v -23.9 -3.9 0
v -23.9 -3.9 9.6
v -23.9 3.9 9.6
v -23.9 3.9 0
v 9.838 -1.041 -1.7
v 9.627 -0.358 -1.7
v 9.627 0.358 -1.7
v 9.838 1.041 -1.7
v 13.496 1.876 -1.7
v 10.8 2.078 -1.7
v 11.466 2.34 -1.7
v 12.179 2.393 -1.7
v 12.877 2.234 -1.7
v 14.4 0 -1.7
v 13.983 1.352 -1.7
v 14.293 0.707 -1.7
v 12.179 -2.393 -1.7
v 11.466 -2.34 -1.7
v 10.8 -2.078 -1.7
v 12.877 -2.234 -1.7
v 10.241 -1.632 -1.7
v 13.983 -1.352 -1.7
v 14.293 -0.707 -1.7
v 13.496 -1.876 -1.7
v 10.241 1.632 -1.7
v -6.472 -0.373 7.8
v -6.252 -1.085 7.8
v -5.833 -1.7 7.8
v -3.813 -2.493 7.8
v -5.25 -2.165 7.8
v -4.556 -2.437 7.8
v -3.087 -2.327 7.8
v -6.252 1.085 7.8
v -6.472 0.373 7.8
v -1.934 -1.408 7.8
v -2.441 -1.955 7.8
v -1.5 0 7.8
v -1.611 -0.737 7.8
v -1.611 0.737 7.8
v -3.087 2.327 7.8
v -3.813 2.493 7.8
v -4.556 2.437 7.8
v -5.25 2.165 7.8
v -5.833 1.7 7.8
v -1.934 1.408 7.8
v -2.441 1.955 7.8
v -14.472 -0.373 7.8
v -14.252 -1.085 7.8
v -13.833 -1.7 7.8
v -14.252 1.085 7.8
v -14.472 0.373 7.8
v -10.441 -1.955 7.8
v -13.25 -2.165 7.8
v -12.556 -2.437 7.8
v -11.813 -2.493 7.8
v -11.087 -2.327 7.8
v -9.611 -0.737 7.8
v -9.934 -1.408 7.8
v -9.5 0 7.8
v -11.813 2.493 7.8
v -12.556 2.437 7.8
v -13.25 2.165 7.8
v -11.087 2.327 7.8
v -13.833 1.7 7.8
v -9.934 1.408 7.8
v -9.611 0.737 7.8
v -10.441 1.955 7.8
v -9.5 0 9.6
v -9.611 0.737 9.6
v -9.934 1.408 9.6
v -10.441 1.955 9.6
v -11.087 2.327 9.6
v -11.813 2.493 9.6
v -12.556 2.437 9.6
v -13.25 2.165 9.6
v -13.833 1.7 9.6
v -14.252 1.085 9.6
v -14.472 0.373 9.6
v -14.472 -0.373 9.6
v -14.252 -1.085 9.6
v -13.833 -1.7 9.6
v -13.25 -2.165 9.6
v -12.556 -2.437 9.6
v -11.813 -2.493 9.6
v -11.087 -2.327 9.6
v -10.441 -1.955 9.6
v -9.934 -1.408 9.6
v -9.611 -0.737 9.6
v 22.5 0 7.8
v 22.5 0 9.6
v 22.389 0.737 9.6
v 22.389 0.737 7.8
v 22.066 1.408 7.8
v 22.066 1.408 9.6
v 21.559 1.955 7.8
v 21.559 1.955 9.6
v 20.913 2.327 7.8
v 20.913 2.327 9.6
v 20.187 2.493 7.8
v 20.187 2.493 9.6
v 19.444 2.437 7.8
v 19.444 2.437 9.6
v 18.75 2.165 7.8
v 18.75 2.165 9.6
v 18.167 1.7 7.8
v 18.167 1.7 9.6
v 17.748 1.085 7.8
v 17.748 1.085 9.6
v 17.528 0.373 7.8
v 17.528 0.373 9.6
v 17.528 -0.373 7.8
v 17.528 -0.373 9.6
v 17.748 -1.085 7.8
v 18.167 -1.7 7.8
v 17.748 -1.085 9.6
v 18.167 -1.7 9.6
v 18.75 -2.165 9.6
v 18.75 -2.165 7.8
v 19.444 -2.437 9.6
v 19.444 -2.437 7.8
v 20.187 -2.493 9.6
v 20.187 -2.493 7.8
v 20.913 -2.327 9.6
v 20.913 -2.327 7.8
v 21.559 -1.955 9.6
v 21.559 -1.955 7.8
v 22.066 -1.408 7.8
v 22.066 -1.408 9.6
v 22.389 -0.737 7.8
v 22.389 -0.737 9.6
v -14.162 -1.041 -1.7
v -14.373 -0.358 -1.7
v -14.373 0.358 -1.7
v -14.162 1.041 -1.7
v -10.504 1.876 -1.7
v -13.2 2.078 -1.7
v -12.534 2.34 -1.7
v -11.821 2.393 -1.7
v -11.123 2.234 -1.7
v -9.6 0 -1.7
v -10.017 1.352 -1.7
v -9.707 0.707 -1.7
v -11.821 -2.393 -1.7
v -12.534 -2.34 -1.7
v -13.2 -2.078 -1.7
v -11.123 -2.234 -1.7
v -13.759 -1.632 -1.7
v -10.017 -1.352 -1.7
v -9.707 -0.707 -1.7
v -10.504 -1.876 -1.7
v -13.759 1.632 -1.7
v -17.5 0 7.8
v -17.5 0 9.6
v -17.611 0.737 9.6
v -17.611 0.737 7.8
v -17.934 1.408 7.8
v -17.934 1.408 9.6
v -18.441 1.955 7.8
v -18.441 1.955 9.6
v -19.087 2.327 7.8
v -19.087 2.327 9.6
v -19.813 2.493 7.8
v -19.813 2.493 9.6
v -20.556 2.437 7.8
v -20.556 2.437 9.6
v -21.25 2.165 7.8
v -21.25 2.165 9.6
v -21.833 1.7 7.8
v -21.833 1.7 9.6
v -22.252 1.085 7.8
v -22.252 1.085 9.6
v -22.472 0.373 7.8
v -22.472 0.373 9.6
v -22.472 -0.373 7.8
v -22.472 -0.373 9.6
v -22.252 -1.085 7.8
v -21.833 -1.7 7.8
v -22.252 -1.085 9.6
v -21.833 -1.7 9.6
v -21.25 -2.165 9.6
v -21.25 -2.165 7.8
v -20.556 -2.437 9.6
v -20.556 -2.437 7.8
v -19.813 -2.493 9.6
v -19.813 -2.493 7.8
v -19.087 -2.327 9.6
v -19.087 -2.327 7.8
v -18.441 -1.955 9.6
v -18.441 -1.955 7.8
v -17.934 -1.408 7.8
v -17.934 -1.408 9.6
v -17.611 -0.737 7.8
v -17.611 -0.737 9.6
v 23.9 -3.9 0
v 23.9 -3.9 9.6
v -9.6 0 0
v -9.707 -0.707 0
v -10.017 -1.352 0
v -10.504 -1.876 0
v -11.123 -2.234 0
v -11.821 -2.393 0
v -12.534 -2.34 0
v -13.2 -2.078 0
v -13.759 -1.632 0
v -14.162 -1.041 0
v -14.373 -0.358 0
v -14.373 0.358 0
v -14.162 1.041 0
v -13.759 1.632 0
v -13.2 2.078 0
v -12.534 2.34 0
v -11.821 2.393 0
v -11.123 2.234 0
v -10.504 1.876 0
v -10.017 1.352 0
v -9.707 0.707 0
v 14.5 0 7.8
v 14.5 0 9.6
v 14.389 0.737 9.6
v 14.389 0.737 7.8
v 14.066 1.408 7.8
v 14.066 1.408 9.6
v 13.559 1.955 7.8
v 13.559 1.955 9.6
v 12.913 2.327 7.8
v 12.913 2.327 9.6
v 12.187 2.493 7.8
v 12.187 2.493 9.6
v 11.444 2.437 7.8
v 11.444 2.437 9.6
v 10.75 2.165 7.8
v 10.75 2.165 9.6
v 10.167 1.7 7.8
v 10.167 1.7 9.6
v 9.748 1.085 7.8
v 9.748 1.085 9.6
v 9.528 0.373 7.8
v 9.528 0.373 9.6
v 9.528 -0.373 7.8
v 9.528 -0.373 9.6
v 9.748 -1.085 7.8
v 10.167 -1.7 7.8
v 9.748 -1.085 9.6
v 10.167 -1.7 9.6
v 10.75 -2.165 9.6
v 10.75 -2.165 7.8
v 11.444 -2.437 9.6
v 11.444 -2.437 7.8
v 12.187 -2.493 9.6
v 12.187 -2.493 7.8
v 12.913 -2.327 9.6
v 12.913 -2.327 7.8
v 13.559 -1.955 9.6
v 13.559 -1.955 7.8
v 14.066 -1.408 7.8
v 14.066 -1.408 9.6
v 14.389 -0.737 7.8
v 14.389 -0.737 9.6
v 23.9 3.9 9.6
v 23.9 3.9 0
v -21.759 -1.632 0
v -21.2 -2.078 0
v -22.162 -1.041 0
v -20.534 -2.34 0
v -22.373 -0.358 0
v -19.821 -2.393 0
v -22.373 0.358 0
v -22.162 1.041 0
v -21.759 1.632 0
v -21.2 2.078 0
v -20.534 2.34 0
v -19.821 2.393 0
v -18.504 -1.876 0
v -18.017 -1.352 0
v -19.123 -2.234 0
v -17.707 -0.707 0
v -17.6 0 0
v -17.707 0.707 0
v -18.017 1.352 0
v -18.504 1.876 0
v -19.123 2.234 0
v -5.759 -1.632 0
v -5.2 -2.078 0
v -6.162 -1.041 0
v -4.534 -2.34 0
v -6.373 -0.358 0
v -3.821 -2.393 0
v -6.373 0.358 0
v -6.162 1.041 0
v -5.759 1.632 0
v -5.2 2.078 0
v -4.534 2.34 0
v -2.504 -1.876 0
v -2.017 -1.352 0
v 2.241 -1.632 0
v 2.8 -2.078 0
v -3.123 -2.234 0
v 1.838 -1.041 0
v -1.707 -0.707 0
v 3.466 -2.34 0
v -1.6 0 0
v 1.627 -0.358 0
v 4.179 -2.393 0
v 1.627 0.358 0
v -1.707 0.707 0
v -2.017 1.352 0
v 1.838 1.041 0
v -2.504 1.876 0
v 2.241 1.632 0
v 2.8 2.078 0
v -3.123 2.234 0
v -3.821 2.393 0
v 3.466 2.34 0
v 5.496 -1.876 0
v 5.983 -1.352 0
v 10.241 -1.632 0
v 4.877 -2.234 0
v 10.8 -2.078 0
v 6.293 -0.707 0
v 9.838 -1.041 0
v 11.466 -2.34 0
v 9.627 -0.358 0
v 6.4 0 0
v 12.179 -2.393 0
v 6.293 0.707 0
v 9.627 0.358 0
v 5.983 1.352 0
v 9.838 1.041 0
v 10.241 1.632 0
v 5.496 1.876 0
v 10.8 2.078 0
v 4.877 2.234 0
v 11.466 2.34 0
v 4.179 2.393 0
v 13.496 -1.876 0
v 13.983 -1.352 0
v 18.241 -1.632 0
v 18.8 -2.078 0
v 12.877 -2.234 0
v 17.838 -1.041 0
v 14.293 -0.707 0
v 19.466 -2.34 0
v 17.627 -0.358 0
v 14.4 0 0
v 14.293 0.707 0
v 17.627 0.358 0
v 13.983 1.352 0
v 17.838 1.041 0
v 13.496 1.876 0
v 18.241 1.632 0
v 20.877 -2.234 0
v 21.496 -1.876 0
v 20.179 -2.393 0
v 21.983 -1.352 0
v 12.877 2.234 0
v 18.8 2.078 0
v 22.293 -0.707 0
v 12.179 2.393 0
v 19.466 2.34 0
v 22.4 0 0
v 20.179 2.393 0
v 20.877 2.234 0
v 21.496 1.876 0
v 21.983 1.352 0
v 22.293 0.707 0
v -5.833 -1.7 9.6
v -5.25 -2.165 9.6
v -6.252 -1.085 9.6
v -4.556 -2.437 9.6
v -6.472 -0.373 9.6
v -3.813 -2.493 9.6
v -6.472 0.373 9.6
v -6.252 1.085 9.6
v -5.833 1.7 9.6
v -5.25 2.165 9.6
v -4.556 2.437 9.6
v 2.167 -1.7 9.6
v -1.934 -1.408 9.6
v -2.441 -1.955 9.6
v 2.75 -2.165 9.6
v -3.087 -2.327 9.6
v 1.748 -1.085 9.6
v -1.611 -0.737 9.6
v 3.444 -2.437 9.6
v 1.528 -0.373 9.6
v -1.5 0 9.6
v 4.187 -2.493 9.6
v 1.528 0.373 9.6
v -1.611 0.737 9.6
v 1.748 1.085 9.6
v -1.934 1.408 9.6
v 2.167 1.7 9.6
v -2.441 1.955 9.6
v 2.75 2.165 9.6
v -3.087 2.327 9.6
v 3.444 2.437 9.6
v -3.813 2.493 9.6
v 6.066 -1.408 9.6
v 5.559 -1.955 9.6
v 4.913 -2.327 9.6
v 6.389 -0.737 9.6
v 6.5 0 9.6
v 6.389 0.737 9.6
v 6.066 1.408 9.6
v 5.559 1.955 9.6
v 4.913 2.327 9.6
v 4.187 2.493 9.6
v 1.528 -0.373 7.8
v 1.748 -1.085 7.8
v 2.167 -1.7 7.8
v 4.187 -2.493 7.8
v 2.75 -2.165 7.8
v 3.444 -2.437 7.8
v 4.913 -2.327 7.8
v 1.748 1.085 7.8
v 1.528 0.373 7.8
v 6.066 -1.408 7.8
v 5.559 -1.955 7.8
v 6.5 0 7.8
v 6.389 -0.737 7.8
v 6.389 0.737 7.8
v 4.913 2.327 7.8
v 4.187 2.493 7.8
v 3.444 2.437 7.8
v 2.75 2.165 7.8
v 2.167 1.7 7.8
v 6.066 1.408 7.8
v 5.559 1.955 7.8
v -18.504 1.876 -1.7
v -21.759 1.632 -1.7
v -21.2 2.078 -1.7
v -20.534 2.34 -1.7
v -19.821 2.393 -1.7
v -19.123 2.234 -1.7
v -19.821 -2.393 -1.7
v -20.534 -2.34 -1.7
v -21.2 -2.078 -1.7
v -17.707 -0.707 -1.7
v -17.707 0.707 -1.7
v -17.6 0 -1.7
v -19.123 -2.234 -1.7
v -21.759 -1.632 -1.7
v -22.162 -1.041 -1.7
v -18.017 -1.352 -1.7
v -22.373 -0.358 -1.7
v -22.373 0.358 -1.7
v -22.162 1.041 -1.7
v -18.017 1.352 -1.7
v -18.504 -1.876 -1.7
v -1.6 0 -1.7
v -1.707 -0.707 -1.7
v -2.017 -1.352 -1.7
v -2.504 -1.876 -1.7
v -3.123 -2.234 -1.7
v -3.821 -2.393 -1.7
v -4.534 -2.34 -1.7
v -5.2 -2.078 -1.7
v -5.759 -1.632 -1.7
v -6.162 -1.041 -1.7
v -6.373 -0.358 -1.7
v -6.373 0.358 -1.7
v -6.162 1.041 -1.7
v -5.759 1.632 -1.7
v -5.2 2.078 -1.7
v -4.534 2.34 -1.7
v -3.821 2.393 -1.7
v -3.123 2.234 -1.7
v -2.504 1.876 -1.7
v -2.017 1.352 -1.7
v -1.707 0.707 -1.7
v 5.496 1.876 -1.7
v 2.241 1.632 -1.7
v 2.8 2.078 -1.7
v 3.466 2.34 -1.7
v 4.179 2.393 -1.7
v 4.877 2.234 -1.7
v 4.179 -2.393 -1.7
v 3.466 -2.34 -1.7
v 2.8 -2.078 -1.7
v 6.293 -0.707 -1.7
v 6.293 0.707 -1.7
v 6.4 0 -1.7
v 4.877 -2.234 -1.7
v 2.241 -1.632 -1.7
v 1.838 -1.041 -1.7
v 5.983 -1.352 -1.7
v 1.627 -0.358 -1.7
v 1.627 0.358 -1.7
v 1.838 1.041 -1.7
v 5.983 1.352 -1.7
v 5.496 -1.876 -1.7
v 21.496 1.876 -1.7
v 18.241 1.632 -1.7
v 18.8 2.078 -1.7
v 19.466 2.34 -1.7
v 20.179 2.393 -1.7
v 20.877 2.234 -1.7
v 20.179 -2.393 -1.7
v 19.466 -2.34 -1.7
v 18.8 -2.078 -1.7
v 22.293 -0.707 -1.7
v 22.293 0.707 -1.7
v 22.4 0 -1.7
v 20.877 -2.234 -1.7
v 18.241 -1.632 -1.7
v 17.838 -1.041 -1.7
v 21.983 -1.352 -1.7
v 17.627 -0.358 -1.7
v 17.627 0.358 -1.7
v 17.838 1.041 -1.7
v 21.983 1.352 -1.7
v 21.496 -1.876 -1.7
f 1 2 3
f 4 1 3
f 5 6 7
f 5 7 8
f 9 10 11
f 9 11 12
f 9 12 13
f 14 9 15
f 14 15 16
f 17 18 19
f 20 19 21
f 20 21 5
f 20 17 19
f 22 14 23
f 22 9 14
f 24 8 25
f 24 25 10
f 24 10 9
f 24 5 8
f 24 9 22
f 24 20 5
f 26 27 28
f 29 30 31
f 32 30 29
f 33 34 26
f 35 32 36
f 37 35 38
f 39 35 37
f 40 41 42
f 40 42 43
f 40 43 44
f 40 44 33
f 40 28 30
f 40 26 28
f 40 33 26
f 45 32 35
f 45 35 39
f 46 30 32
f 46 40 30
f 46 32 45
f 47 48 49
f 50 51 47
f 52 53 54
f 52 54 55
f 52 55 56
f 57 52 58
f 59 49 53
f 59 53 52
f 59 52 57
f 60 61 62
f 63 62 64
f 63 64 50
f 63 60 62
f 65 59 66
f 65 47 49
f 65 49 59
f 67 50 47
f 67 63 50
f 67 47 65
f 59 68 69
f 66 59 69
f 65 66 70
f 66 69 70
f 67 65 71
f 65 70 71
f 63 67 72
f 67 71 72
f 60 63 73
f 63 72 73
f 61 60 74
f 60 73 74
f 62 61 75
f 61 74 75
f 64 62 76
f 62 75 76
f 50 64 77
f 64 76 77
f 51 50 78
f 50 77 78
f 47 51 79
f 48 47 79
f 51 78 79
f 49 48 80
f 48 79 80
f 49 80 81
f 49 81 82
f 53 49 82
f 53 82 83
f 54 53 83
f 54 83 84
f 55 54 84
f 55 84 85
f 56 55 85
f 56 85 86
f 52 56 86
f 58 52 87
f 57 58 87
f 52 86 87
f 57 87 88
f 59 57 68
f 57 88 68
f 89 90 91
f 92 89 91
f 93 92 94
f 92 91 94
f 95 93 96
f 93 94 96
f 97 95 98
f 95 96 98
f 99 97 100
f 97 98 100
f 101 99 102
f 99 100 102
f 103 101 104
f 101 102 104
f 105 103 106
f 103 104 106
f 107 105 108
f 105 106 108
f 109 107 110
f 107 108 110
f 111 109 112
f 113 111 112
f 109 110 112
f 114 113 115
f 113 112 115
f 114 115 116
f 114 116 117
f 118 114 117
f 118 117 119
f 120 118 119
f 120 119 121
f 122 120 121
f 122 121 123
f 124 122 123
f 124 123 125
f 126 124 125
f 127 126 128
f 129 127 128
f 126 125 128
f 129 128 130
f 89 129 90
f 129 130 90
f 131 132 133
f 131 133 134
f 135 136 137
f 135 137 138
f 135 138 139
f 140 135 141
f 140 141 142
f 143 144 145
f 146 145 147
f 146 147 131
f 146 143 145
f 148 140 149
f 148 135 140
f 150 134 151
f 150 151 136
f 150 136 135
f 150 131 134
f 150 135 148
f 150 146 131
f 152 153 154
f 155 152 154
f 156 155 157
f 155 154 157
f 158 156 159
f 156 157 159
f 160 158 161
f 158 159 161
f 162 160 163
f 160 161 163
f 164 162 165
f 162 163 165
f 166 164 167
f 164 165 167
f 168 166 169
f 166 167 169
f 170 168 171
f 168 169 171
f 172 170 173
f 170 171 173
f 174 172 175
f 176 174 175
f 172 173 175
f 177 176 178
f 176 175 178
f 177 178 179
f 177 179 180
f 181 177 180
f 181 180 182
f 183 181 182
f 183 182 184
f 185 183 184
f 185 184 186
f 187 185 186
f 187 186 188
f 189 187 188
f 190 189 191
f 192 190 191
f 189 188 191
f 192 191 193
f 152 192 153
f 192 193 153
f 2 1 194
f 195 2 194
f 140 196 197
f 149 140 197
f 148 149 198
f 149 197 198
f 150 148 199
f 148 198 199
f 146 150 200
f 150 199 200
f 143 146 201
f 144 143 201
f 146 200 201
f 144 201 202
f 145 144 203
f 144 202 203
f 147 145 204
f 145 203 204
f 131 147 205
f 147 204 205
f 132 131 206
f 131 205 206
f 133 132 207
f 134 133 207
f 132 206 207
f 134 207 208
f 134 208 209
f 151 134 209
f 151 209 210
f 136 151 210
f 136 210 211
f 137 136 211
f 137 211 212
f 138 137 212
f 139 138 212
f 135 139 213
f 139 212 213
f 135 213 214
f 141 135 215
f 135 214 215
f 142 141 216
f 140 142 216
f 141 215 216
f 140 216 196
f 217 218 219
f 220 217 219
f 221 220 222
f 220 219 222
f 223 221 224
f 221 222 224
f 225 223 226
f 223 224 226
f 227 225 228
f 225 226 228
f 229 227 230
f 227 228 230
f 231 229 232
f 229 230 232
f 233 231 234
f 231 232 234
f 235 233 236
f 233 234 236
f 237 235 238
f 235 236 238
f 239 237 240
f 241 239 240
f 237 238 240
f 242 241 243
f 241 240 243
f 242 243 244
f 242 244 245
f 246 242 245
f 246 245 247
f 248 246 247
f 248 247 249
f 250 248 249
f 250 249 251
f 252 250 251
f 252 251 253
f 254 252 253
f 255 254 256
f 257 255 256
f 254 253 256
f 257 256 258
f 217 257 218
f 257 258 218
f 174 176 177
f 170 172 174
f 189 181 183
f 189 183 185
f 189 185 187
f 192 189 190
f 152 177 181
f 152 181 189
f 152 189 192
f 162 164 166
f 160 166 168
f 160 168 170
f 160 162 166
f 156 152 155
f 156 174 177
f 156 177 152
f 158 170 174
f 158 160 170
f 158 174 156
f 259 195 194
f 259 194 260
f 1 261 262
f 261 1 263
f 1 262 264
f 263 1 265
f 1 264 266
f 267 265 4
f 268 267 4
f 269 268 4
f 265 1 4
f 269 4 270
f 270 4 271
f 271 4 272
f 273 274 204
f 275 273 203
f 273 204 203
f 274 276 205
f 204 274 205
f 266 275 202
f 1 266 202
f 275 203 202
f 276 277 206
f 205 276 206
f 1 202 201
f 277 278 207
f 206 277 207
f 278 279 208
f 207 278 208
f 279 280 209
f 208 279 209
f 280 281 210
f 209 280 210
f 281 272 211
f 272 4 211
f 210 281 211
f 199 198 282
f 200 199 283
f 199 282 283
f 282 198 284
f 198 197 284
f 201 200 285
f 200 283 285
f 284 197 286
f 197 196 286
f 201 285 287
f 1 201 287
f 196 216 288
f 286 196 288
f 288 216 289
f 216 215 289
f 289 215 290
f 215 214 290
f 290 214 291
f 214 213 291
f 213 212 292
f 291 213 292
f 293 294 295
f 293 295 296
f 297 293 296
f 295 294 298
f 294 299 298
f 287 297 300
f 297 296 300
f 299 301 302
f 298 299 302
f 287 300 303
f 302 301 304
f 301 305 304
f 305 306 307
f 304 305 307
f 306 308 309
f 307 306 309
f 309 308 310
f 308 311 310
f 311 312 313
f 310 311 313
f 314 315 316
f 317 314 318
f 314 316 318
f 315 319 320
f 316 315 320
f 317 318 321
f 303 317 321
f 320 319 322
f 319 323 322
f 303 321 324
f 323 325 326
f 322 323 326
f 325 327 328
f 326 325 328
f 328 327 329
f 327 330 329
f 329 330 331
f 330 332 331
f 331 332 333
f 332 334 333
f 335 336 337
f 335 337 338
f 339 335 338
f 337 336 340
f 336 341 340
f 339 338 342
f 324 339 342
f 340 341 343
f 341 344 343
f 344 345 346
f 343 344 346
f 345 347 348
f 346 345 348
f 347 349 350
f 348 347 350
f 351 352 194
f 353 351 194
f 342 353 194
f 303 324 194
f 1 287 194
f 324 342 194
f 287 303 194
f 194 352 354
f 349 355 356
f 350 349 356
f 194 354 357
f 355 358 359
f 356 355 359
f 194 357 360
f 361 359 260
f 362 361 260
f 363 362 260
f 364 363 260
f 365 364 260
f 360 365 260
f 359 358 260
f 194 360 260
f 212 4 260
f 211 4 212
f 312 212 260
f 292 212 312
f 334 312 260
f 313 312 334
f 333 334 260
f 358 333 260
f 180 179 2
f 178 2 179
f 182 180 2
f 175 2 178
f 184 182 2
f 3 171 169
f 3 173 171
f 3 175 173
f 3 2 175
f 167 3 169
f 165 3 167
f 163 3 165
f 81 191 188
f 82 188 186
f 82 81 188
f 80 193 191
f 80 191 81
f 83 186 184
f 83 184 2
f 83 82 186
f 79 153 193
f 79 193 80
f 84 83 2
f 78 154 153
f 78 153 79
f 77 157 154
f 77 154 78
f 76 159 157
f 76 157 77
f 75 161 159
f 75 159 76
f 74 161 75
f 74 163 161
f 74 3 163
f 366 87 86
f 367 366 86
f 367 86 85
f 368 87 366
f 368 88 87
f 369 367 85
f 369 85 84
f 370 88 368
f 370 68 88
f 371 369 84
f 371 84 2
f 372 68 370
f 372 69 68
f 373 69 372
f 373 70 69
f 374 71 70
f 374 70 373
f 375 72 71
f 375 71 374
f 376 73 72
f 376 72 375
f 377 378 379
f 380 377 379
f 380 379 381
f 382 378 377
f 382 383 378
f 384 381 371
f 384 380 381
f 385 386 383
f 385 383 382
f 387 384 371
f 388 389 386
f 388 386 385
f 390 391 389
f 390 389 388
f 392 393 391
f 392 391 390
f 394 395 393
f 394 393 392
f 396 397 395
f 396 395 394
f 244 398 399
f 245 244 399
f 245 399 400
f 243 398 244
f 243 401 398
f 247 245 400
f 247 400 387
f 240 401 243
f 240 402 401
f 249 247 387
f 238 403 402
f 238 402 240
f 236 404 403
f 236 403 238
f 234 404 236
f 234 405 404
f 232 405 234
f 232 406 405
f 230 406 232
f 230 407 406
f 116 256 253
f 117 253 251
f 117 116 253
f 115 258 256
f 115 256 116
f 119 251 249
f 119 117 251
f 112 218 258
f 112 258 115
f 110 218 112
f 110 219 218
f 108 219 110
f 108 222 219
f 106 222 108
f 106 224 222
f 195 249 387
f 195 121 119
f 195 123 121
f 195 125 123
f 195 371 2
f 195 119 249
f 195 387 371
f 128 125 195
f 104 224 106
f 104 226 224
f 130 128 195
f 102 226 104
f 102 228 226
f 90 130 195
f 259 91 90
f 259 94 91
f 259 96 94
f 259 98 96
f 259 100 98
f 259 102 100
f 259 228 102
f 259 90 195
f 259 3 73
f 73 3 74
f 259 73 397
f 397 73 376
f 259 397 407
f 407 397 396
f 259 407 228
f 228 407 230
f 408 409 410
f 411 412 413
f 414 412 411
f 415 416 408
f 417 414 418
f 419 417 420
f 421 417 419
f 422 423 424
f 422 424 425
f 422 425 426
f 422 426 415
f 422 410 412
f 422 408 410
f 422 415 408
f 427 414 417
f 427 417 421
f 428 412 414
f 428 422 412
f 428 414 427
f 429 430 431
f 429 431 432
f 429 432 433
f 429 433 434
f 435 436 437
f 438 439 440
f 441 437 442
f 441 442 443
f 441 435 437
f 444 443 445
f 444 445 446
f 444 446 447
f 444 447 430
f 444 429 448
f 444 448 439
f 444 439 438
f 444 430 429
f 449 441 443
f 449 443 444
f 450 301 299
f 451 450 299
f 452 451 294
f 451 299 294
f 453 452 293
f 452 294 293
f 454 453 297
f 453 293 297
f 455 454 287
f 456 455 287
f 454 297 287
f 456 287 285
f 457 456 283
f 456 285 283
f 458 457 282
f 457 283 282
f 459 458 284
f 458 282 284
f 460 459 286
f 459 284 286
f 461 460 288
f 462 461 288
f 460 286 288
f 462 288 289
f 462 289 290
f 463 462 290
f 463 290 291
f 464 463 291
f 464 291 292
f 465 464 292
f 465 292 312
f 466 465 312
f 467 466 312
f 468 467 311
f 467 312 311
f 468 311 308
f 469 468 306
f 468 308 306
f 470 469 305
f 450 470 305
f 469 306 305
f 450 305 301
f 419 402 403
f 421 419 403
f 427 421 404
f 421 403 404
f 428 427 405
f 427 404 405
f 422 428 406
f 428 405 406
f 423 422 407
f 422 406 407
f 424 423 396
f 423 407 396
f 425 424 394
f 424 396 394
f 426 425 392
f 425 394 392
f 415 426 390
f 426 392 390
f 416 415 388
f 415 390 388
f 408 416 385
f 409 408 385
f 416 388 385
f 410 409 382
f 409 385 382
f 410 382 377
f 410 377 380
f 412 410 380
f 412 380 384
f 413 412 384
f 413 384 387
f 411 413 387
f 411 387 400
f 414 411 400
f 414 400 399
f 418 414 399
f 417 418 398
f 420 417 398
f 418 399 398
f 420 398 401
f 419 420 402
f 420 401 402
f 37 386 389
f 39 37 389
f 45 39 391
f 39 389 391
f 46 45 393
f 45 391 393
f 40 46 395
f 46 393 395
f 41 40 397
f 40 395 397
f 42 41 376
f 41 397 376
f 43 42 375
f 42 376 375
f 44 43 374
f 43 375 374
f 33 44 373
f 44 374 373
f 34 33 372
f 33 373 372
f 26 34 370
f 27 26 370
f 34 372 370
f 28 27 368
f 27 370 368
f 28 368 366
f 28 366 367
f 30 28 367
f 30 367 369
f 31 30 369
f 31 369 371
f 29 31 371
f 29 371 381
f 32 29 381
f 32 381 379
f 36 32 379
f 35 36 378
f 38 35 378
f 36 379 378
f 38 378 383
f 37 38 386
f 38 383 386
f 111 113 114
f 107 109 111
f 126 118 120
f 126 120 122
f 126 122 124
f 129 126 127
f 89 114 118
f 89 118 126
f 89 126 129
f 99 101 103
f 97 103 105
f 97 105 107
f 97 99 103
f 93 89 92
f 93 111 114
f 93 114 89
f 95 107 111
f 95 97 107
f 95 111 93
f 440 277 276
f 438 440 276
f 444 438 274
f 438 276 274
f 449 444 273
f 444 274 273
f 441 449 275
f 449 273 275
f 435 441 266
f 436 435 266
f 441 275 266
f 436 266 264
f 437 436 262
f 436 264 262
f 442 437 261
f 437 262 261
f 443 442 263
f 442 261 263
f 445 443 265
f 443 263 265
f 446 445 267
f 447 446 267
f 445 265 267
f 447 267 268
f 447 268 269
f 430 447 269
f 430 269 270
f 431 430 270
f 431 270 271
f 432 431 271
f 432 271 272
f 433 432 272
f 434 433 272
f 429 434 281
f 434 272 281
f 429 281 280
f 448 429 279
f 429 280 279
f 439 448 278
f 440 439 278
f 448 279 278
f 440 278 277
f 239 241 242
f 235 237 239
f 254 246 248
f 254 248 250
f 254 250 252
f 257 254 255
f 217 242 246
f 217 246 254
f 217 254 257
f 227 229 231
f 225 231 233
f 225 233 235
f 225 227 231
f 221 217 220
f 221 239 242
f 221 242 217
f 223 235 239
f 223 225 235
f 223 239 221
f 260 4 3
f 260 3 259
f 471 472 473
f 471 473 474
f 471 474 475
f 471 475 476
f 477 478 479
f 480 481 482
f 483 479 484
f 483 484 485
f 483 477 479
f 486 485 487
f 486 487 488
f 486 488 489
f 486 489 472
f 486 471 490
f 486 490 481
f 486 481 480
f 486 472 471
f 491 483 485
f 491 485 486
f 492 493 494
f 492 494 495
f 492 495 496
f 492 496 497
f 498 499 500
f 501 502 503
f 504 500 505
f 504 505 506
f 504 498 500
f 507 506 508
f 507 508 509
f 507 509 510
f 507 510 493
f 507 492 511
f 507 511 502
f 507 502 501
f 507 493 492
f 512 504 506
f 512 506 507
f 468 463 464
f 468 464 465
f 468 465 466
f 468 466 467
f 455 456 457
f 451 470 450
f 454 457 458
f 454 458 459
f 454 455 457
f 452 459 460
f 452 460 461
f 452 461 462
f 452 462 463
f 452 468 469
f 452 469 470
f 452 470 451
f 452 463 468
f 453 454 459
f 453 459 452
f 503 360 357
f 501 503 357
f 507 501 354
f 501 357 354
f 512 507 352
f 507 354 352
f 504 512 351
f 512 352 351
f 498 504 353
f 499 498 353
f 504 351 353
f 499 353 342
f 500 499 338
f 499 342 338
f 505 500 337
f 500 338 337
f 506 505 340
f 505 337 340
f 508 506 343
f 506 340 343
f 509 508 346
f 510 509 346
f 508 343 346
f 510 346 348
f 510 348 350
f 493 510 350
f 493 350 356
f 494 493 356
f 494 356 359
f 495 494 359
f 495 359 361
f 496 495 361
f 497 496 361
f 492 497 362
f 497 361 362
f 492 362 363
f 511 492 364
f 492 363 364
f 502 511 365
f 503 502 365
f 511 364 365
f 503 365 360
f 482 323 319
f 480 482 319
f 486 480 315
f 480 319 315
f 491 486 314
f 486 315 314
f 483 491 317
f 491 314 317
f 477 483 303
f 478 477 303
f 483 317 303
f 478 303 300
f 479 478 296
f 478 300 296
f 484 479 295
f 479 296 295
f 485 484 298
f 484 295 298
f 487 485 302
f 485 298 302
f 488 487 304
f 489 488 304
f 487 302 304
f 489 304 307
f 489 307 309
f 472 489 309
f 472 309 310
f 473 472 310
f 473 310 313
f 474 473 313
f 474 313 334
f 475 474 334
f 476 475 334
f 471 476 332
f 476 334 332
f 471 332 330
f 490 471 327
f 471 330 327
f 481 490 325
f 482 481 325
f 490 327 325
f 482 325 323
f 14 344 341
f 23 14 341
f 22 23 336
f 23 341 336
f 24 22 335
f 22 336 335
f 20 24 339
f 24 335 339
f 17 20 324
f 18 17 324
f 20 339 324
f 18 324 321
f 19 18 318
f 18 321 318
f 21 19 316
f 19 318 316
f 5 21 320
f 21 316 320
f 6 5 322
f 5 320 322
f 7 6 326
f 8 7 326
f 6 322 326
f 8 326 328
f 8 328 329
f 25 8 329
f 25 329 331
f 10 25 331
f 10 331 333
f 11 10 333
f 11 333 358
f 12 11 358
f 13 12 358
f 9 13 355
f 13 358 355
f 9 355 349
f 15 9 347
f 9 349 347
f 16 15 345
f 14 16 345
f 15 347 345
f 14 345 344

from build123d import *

# Parameters (mm, degrees)
SKETCH_1_W          = 47.8
SKETCH_1_H          = 7.8
EXTRUDE_1_DEPTH     = 9.6
SKETCH_2_R          = 2.4
EXTRUDE_2_DEPTH     = 1.7
SKETCH_4_R          = 2.5
CUT_EXTRUDE_1_DEPTH = 1.8


with BuildPart() as part:
    # Эскиз1 → Бобышка-Вытянуть1 (new body)
    with BuildSketch(Plane.XY):
        Rectangle(SKETCH_1_W, SKETCH_1_H)
    extrude(amount=EXTRUDE_1_DEPTH)

    # Эскиз2 → Бобышка-Вытянуть2 (add)
    with BuildSketch(Plane(origin=(0, 0, 0), x_dir=(-1, 0, 0), z_dir=(0, 0, -1))):
        with Locations(Location((-20, 0, 0), (0, 0, 180))):
            Circle(SKETCH_2_R)
        with Locations(Location((-12, 0, 0), (0, 0, 180))):
            Circle(SKETCH_2_R)
        with Locations(Location((-4, 0, 0), (0, 0, 180))):
            Circle(SKETCH_2_R)
        with Locations(Location((4, 0, 0), (0, 0, 180))):
            Circle(SKETCH_2_R)
        with Locations(Location((12, 0, 0), (0, 0, 180))):
            Circle(SKETCH_2_R)
        with Locations(Location((20, 0, 0), (0, 0, 180))):
            Circle(SKETCH_2_R)
    extrude(amount=EXTRUDE_2_DEPTH)

    # Эскиз4 → Вырез-Вытянуть1 (cut)
    with BuildSketch(Plane.XY.offset(9.6)):
        with Locations((-20, 0)):
            Circle(SKETCH_4_R)
        with Locations((-12, 0)):
            Circle(SKETCH_4_R)
        with Locations((-4, 0)):
            Circle(SKETCH_4_R)
        with Locations((4, 0)):
            Circle(SKETCH_4_R)
        with Locations((12, 0)):
            Circle(SKETCH_4_R)
        with Locations((20, 0)):
            Circle(SKETCH_4_R)
    extrude(amount=-CUT_EXTRUDE_1_DEPTH, mode=Mode.SUBTRACT)


solid = part.part
